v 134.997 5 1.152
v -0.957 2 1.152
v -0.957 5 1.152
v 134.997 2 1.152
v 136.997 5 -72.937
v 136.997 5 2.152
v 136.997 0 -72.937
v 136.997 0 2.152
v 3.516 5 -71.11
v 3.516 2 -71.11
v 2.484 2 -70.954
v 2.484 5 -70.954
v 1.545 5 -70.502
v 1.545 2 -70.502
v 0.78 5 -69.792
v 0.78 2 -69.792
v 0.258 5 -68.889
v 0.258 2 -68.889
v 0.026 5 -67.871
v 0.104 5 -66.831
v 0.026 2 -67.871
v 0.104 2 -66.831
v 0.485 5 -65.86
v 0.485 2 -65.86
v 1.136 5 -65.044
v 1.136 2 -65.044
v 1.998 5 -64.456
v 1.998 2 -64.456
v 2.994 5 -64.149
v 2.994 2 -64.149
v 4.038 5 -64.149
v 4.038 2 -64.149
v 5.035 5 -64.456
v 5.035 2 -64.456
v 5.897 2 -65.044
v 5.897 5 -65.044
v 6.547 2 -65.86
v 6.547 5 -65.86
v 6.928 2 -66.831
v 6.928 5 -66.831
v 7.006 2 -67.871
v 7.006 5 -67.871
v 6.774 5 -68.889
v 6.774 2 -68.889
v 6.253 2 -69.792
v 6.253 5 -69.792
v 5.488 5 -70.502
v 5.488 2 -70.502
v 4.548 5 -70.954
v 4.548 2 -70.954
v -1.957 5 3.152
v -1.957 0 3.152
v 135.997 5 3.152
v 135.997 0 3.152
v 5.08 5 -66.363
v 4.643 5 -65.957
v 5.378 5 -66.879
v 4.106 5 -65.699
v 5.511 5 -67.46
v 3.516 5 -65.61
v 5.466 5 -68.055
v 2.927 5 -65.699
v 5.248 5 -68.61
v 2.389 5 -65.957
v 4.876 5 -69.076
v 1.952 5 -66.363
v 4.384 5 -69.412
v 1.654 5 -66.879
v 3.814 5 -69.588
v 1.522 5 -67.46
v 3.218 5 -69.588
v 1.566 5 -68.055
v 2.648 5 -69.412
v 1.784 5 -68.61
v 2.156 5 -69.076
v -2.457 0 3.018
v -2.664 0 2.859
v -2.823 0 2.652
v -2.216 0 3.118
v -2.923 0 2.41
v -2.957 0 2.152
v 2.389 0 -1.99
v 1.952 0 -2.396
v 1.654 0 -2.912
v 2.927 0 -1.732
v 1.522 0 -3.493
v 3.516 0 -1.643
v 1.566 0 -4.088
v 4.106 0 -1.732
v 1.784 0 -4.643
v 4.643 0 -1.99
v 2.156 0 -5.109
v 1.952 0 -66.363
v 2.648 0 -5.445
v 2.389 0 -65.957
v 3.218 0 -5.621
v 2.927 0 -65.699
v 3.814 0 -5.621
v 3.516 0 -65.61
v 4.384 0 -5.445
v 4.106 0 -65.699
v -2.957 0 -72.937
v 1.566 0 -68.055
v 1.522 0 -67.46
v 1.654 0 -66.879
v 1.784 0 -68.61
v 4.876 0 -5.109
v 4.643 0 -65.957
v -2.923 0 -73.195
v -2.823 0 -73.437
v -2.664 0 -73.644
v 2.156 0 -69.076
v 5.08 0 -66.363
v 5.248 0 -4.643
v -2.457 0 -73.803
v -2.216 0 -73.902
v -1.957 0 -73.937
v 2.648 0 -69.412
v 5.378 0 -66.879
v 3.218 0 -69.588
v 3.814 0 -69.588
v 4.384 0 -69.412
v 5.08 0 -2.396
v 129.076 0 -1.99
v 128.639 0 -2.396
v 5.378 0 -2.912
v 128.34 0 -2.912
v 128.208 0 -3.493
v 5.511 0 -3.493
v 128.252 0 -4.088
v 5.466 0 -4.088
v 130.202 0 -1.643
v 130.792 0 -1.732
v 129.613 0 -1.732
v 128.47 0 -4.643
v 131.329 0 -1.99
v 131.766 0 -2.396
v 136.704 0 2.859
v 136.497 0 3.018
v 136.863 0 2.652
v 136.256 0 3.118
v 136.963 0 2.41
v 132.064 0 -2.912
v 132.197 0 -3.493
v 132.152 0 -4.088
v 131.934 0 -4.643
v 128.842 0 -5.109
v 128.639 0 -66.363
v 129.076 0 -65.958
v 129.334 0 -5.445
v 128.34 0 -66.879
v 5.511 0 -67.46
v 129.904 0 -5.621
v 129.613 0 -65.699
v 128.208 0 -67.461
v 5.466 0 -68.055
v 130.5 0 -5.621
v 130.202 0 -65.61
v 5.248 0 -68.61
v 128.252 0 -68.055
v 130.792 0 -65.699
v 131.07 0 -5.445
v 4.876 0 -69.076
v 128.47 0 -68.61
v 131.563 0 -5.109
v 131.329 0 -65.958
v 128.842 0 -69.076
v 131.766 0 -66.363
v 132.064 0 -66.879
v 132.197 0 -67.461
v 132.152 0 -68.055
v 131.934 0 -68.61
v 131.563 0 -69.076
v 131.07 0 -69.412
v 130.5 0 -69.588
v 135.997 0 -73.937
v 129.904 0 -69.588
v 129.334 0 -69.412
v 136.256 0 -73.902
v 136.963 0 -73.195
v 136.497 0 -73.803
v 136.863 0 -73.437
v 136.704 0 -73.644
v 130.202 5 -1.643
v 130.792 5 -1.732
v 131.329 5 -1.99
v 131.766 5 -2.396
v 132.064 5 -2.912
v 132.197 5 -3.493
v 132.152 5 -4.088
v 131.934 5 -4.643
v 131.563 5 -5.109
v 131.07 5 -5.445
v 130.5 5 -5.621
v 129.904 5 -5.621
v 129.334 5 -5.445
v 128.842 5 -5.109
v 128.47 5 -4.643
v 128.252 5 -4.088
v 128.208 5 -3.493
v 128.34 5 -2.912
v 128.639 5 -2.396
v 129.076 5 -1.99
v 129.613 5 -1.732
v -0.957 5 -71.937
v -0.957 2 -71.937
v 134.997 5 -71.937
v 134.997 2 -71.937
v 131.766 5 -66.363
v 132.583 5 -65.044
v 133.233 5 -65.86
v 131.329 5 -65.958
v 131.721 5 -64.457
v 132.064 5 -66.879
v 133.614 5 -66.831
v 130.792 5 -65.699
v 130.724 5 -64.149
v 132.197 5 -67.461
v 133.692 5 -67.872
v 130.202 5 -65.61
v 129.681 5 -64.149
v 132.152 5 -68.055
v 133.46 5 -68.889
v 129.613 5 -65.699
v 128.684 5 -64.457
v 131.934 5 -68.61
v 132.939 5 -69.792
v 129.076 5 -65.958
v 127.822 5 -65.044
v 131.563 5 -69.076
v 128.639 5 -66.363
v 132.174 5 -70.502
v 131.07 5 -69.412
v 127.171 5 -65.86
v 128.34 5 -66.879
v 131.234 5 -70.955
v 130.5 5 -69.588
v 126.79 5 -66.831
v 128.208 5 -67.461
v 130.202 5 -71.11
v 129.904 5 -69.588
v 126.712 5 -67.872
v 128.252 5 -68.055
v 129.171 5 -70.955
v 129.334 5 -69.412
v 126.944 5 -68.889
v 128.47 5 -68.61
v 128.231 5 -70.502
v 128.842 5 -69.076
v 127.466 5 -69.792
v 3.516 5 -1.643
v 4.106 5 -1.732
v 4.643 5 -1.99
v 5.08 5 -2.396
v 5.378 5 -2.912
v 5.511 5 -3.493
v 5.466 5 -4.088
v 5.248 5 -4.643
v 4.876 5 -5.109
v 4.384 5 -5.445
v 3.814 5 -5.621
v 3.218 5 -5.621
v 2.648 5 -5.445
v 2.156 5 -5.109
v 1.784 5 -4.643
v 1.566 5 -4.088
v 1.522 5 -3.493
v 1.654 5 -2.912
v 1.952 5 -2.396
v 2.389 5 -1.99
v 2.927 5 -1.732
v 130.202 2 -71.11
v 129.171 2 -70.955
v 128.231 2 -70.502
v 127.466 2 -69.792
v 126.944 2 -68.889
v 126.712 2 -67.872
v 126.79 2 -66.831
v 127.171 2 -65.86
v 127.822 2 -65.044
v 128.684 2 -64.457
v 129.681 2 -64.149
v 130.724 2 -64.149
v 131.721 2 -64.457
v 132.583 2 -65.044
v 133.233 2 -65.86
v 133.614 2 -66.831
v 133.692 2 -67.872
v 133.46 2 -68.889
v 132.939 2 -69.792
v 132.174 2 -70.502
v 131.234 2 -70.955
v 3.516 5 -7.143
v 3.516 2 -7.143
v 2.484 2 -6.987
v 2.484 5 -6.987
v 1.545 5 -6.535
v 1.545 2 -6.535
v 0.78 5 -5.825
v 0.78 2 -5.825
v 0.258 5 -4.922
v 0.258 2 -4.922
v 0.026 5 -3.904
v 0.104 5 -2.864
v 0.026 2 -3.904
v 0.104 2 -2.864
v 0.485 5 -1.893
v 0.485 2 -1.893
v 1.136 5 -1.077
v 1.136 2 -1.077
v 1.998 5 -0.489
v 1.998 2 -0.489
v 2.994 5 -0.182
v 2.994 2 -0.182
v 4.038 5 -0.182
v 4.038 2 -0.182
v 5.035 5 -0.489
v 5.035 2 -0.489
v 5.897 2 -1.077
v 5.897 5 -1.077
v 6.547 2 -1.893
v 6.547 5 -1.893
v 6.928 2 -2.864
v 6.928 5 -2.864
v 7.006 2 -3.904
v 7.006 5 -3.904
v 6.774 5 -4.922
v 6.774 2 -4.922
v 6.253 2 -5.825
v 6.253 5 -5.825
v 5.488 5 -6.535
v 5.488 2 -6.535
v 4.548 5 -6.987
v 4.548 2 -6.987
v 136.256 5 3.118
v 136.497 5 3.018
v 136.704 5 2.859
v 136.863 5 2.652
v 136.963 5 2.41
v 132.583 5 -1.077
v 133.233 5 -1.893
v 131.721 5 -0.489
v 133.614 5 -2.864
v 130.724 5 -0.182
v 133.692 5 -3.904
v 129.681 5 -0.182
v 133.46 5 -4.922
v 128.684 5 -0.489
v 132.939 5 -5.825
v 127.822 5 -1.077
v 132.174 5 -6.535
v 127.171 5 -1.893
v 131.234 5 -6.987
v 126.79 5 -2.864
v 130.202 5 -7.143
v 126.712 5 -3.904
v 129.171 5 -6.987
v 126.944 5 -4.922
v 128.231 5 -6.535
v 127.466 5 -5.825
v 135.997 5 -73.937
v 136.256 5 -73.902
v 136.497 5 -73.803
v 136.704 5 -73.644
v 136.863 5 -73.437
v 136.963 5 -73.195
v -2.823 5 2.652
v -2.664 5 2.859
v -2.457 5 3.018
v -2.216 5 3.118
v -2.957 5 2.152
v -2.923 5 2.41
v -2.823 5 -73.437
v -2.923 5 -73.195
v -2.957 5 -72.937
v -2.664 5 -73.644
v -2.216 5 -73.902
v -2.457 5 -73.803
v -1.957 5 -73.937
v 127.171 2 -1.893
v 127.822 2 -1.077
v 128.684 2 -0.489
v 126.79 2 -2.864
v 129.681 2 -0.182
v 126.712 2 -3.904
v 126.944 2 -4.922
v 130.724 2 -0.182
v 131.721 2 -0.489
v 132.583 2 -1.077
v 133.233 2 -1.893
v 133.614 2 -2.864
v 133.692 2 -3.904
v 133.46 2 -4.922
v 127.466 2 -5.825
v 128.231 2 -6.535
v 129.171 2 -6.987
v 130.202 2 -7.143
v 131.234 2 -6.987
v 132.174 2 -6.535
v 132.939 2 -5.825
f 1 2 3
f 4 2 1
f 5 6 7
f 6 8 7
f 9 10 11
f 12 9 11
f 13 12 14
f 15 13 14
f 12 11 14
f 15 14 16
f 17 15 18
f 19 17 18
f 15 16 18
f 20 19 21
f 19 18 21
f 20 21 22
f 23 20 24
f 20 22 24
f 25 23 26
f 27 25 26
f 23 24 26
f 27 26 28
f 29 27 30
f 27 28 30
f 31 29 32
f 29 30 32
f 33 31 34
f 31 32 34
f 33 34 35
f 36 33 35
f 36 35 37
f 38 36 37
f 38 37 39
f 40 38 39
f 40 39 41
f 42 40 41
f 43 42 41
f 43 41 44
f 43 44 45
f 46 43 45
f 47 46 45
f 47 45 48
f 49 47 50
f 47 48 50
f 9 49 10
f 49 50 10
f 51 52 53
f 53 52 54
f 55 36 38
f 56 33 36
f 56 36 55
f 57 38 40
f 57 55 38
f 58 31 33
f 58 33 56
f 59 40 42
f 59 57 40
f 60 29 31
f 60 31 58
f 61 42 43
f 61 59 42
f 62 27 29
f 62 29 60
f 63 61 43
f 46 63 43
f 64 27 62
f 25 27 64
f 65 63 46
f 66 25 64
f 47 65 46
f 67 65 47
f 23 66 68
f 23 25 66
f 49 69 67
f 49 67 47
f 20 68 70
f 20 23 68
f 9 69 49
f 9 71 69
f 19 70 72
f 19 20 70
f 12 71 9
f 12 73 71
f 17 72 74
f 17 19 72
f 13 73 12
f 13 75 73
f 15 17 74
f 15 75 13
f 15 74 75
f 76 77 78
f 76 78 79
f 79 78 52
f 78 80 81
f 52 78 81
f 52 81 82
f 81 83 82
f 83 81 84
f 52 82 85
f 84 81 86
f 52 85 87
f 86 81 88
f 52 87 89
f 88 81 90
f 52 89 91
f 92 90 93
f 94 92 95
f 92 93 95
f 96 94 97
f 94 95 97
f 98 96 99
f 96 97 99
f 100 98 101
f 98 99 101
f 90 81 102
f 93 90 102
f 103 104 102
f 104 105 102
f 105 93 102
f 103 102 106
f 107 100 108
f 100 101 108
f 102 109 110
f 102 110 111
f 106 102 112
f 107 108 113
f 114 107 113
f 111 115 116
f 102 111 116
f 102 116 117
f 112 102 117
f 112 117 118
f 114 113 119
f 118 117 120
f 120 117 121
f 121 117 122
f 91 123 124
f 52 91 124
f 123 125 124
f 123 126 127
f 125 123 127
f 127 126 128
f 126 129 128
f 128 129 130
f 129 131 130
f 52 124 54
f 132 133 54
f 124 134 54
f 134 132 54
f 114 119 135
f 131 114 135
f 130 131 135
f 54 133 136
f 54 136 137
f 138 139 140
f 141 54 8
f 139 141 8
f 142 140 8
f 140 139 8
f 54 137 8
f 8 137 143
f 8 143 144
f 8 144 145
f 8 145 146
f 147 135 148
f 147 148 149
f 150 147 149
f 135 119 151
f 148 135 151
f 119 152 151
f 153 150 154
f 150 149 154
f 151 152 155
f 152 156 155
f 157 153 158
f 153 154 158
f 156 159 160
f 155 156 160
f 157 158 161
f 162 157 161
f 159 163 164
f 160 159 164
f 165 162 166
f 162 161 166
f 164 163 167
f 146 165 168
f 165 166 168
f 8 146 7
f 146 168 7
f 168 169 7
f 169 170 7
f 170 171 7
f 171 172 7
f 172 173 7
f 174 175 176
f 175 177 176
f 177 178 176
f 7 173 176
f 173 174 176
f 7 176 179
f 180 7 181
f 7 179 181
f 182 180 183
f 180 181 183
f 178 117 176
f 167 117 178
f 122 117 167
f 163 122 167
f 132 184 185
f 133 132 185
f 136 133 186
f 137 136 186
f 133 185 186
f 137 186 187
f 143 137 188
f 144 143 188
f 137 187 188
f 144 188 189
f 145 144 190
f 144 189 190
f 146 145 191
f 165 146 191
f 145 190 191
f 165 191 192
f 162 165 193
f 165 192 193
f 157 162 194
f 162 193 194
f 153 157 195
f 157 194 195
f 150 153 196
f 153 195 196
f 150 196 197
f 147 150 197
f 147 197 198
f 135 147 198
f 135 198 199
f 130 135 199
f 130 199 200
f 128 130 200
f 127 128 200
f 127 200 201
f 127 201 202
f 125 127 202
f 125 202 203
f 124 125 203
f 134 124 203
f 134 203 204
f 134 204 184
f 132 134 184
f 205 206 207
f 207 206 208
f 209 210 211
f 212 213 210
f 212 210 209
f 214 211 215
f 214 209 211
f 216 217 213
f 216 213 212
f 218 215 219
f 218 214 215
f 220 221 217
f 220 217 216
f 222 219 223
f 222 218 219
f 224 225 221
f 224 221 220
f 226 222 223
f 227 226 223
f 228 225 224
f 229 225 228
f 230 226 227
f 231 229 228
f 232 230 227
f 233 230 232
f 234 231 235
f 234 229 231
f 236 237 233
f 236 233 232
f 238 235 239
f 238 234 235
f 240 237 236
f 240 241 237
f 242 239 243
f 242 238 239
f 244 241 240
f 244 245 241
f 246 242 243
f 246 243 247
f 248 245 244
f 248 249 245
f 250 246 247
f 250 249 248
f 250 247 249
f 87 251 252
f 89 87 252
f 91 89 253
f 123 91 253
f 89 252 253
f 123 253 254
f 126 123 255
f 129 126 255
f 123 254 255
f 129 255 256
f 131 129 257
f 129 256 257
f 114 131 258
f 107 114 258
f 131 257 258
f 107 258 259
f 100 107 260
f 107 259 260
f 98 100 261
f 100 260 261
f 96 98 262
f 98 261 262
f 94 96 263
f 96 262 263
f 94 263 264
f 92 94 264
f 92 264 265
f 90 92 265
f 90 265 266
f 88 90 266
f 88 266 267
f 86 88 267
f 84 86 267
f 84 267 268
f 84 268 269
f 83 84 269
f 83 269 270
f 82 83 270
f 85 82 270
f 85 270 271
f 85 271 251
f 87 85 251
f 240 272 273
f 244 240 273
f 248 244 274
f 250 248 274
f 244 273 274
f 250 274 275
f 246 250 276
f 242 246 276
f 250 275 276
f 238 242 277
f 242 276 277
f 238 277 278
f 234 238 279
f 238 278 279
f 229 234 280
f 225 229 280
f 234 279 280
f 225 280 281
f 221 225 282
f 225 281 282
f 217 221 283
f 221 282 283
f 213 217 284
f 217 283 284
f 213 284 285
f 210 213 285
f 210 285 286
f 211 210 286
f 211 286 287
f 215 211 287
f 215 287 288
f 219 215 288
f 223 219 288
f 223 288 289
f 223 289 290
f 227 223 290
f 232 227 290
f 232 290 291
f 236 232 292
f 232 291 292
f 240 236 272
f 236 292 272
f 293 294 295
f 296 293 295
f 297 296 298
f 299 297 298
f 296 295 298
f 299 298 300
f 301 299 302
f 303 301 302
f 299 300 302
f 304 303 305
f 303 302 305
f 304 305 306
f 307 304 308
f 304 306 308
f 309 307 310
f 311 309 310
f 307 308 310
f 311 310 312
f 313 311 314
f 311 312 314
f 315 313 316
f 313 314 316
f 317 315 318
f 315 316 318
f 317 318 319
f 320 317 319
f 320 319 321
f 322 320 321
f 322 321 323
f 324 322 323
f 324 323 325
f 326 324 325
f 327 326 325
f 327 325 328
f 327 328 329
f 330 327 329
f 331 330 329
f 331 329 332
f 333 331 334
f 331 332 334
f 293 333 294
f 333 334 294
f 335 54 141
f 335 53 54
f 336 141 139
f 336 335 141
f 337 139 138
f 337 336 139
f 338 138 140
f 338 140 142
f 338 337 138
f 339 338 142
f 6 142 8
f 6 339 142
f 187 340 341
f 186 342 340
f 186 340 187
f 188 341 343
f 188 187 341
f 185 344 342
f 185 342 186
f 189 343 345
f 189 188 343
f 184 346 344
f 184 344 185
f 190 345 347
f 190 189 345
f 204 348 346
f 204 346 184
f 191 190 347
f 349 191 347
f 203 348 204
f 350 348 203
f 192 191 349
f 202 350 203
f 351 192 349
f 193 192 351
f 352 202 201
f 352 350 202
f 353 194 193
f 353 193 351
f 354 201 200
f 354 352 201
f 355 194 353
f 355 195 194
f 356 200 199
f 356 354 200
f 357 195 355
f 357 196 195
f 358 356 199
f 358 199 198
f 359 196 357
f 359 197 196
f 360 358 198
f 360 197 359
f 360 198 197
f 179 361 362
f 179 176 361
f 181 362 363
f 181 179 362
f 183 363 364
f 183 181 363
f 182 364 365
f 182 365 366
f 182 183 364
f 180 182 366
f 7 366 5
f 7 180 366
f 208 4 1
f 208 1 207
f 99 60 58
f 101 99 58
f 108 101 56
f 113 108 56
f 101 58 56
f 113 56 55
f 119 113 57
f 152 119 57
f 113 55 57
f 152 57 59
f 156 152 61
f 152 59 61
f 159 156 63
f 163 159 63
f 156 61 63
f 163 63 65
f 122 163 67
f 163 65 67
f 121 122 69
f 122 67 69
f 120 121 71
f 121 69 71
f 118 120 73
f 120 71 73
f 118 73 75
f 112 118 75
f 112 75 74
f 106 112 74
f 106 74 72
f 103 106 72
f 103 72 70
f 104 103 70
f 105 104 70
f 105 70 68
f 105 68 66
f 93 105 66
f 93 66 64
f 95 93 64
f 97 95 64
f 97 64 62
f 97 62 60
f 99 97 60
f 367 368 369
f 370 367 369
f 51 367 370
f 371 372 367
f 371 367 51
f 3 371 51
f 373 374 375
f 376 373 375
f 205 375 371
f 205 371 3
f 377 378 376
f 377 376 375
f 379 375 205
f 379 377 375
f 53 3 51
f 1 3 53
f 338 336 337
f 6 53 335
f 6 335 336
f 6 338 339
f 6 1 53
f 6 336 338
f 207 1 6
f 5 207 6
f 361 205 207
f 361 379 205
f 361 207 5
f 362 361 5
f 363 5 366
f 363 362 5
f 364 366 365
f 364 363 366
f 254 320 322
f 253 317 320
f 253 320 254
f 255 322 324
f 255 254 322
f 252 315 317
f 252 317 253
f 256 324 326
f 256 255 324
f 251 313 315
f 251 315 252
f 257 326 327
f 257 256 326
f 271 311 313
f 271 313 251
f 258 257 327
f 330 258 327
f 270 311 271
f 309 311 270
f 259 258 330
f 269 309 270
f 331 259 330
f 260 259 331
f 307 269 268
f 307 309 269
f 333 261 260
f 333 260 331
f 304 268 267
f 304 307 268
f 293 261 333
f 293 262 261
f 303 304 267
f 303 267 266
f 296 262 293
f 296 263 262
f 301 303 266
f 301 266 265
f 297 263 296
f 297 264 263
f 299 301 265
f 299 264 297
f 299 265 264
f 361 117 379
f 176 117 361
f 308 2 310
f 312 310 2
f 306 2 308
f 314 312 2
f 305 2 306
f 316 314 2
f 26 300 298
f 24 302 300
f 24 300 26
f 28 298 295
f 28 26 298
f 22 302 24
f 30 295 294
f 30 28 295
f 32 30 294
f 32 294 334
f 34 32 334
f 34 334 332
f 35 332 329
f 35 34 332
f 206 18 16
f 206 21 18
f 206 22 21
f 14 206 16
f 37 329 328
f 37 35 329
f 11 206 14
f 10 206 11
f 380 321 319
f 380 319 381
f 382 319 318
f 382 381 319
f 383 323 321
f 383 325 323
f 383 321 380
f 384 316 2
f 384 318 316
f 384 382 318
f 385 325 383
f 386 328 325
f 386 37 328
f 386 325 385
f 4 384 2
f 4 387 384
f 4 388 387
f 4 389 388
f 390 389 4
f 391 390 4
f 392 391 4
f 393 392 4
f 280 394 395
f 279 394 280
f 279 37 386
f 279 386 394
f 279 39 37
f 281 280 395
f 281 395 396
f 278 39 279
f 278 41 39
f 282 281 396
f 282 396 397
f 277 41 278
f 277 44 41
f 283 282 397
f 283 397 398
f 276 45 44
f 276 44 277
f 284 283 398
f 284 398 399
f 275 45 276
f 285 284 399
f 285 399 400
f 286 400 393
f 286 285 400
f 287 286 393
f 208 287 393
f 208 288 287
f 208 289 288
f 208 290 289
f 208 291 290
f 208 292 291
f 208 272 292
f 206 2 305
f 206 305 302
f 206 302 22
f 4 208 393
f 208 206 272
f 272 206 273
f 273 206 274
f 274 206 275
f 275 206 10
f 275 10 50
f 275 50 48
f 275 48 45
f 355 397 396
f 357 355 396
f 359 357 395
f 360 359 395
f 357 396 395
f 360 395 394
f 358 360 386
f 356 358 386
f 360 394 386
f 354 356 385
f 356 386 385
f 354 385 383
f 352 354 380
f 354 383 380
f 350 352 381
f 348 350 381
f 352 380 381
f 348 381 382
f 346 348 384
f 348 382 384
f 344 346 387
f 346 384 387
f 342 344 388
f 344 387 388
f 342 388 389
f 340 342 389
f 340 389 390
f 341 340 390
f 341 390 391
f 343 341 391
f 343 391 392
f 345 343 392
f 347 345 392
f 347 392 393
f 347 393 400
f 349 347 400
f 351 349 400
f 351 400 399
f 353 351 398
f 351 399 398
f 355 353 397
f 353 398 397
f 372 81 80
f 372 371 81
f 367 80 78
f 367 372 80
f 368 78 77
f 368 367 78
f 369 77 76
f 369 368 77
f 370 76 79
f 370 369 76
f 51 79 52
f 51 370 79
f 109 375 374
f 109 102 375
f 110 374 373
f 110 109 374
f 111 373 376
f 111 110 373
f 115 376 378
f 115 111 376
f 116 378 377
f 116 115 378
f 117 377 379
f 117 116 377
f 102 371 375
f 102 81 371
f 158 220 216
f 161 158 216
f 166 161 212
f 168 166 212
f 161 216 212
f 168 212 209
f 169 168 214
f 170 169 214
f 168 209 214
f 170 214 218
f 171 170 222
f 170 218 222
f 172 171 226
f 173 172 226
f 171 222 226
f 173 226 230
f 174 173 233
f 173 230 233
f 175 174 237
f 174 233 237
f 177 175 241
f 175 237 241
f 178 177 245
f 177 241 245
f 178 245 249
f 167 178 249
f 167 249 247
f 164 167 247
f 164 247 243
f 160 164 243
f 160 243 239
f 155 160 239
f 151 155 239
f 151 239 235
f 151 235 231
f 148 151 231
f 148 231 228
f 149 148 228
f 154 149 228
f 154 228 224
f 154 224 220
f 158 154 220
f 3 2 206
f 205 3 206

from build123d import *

# Parameters (mm, degrees)
SKETCH2_W           = 139.954254508
SKETCH2_H           = 77.088138176
BOSS_EXTRUDE1_DEPTH = 2
SKETCH3_W           = 139.954254508
SKETCH3_H           = 77.088138176
SKETCH3_W_2         = 135.954254508
SKETCH3_H_2         = 73.088138176
SKETCH3_R           = 3.5
BOSS_EXTRUDE2_DEPTH = 3
SKETCH4_R           = 2
CUT_EXTRUDE1_DEPTH  = 9
FILLET1_R           = 1


with BuildPart() as part:
    # Sketch2 → Boss-Extrude1 (new body)
    with BuildSketch(Plane(origin=(0, 0, 0), x_dir=(1, 0, 0), z_dir=(0, 1, 0))):
        with Locations((67.02005334, 35.392456185)):
            Rectangle(SKETCH2_W, SKETCH2_H)
    extrude(amount=BOSS_EXTRUDE1_DEPTH)

    # Sketch3 → Boss-Extrude2 (add)
    # profile 1 of 5: a face of its own
    with BuildSketch(Plane(origin=(0, 2, 0), x_dir=(1, 0, 0), z_dir=(0, 1, 0))):
        with Locations((67.02005334, 35.392456185)):
            Rectangle(SKETCH3_W, SKETCH3_H)
        with Locations((67.02005334, 35.392456185)):
            Rectangle(SKETCH3_W_2, SKETCH3_H_2, mode=Mode.SUBTRACT)
    # profile 2 of 5: a face of its own
    with BuildSketch(Plane(origin=(0, 2, 0), x_dir=(1, 0, 0), z_dir=(0, 1, 0))):
        with Locations(Location((3.516129032, 3.642875286, 0), (0, 0, 90))):
            Circle(SKETCH3_R)
    # profile 3 of 5: a face of its own
    with BuildSketch(Plane(origin=(0, 2, 0), x_dir=(1, 0, 0), z_dir=(0, 1, 0))):
        with Locations(Location((3.516129032, 67.60985522, 0), (0, 0, 90))):
            Circle(SKETCH3_R)
    # profile 4 of 5: a face of its own
    with BuildSketch(Plane(origin=(0, 2, 0), x_dir=(1, 0, 0), z_dir=(0, 1, 0))):
        with Locations(Location((130.202184404, 67.61010922, 0), (0, 0, 90))):
            Circle(SKETCH3_R)
    # profile 5 of 5: a face of its own
    with BuildSketch(Plane(origin=(0, 2, 0), x_dir=(1, 0, 0), z_dir=(0, 1, 0))):
        with Locations(Location((130.202184404, 3.642875286, 0), (0, 0, 90))):
            Circle(SKETCH3_R)
    extrude(amount=BOSS_EXTRUDE2_DEPTH)

    # Sketch4 → Cut-Extrude1 (cut)
    with BuildSketch(Plane(origin=(0, 5, 0), x_dir=(1, 0, 0), z_dir=(0, 1, 0))):
        with Locations(Location((3.516129032, 67.60985522, 0), (0, 0, 270))):
            Circle(SKETCH4_R)
        with Locations(Location((130.202184404, 67.61010922, 0), (0, 0, 270))):
            Circle(SKETCH4_R)
        with Locations(Location((130.202184404, 3.642875286, 0), (0, 0, 270))):
            Circle(SKETCH4_R)
        with Locations(Location((3.516129032, 3.642875286, 0), (0, 0, 270))):
            Circle(SKETCH4_R)
    extrude(amount=-CUT_EXTRUDE1_DEPTH, mode=Mode.SUBTRACT)

    # Fillet1
    fillet1_edges = [part.edges().sort_by_distance(p)[0] for p in [
        (136.997180594, 2.5, -73.936525273),
        (136.997180594, 2.5, 3.151612903),
        (-2.957073914, 2.5, 3.151612903),
        (-2.957073914, 2.5, -73.936525273),
    ]]
    fillet(fillet1_edges, radius=FILLET1_R)


solid = part.part
